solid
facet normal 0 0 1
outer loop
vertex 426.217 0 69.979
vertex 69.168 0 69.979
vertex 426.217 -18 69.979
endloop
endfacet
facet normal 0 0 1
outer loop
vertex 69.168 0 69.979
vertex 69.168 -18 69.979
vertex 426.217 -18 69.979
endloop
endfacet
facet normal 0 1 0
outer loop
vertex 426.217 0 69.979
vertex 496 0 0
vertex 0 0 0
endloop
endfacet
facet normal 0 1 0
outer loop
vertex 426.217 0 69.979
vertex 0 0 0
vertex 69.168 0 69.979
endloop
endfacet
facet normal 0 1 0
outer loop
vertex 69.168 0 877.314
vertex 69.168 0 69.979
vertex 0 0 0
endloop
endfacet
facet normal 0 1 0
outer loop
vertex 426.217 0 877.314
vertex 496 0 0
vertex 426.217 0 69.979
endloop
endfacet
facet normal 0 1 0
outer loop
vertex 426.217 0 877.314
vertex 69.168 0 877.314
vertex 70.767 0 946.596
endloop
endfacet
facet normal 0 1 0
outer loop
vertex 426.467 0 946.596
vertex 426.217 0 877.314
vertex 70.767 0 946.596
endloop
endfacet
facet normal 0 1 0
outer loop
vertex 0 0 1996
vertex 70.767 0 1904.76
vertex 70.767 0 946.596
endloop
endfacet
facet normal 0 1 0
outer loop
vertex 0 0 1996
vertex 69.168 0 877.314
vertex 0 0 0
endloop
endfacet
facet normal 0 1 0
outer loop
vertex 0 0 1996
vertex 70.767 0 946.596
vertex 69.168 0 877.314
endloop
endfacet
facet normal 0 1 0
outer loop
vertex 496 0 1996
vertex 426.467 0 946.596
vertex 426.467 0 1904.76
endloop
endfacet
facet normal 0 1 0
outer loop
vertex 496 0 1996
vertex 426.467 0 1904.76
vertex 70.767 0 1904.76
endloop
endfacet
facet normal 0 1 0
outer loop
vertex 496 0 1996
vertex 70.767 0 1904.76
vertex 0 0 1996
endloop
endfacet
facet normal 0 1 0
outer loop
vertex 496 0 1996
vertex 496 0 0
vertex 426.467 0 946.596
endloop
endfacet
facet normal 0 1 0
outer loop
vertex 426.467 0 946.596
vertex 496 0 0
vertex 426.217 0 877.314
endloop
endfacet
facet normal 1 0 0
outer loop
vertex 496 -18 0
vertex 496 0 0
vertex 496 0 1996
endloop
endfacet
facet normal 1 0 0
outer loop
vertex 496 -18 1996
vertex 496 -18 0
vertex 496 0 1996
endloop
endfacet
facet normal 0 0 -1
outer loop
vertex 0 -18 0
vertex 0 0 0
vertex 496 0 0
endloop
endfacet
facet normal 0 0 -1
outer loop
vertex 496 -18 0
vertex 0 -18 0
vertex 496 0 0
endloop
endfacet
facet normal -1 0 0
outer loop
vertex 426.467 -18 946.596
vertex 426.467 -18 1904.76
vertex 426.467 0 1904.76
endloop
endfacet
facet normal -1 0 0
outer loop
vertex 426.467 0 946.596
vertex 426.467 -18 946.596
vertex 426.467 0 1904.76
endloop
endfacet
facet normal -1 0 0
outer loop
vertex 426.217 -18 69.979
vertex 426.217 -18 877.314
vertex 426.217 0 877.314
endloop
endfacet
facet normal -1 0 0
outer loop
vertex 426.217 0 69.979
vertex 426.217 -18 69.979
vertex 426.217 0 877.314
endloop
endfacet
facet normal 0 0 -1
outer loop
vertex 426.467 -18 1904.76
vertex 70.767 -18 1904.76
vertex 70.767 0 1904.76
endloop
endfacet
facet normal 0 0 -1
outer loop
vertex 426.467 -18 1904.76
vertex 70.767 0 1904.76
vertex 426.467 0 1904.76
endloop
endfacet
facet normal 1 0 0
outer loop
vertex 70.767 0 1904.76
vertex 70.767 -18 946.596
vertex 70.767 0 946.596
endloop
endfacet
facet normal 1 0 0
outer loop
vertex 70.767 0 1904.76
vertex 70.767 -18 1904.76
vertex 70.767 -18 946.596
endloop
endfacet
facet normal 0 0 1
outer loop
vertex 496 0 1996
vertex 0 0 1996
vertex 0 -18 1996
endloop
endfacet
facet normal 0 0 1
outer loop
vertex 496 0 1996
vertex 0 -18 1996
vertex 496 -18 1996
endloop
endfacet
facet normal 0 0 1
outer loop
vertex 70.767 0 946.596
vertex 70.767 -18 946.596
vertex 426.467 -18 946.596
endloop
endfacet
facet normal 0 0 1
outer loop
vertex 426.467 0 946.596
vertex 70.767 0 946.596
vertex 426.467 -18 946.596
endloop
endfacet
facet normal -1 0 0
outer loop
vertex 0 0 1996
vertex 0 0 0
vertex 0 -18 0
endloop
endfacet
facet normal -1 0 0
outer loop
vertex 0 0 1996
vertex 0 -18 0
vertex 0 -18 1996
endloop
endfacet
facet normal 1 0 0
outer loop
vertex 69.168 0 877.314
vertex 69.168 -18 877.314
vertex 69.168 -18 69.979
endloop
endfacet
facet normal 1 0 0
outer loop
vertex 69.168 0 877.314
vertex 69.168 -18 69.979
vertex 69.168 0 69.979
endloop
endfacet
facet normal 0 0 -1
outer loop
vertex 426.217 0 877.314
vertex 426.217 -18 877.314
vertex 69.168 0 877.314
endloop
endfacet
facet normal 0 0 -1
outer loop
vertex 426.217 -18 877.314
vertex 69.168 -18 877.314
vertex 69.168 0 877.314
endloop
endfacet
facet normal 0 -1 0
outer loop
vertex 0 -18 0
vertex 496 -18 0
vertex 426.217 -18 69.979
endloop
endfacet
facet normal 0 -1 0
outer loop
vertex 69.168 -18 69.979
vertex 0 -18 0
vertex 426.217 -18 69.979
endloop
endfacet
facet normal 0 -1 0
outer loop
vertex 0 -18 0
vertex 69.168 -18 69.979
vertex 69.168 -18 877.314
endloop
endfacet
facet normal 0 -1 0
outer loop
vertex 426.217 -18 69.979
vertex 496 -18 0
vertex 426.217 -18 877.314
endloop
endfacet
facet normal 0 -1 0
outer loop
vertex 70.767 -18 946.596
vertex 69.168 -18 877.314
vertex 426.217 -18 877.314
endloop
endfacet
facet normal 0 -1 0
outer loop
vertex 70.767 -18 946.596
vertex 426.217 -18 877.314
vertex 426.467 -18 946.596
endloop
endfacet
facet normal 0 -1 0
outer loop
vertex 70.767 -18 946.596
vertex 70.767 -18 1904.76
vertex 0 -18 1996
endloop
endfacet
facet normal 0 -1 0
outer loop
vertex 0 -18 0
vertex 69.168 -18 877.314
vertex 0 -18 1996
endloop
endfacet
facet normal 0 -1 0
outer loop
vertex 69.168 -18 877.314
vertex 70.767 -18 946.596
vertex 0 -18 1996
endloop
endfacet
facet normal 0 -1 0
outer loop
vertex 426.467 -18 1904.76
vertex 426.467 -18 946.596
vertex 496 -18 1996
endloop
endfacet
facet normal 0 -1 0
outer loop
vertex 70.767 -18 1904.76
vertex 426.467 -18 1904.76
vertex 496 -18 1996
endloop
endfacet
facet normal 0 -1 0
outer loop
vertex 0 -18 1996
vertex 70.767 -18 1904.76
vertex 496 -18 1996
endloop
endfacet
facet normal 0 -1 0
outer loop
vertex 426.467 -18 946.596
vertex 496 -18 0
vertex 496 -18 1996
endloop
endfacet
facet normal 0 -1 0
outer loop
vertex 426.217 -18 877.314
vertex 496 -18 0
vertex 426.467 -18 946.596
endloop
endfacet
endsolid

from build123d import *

# Parameters (mm, degrees)
F0_W      = 50.518155098
F0_H      = 63.5085105896
F1_DEPTH  = 18
F2_DEPTH  = 496
F3_DEPTH  = 1996
F4_W      = 317.0488774776
F4_H      = 672.3350584507
F5_DEPTH  = 18
F6_DEPTH  = 66
F7_DEPTH  = 68
F8_DEPTH  = 6
F9_DEPTH  = 282
F10_DEPTH = 44
F11_DEPTH = 147
F12_W     = 357.6997369528
F12_H     = 883.1646442413
F13_DEPTH = 18
F14_DEPTH = 75
F15_DEPTH = 2


with BuildPart() as f1:
    # F0 (on Front) → F1 (new body)
    with BuildSketch(Plane.XZ):
        with Locations((25.259077549, 31.7542552948)):
            Rectangle(F0_W, F0_H)
    extrude(amount=F1_DEPTH)

    # F2 (add): a face of the model
    f2_faces = [f1.faces().sort_by_distance(p)[0] for p in [
        (0, -9, 31.7542552948),
    ]]
    extrude(f2_faces, amount=-F2_DEPTH)

    # F3 (add): a face of the model
    f3_faces = [f1.faces().sort_by_distance(p)[0] for p in [
        (248, -9, 0),
    ]]
    extrude(f3_faces, amount=-F3_DEPTH)

    # F4 (on face) → F5 (cut)
    with BuildSketch(Plane.XZ.offset(18)):
        with Locations((223.6920744181, 688.1462782621)):
            Rectangle(F4_W, F4_H)
    extrude(amount=-F5_DEPTH, mode=Mode.SUBTRACT)

    # F6 (add): a face of the model
    f6_faces = [f1.faces().sort_by_distance(p)[0] for p in [
        (65.1676356792, -9, 688.1462782621),
    ]]
    extrude(f6_faces, amount=F6_DEPTH)

    # F7 (cut): a face of the model
    f7_faces = [f1.faces().sort_by_distance(p)[0] for p in [
        (131.1676356792, -9, 688.1462782621),
    ]]
    extrude(f7_faces, amount=-F7_DEPTH, mode=Mode.SUBTRACT)

    # F8 (add): a face of the model
    f8_faces = [f1.faces().sort_by_distance(p)[0] for p in [
        (63.1676356792, -9, 688.1462782621),
    ]]
    extrude(f8_faces, amount=F8_DEPTH)

    # F9 (cut): a face of the model
    f9_faces = [f1.faces().sort_by_distance(p)[0] for p in [
        (225.6920744181, -9, 351.9787490368),
    ]]
    extrude(f9_faces, amount=-F9_DEPTH, mode=Mode.SUBTRACT)

    # F10 (cut): a face of the model
    f10_faces = [f1.faces().sort_by_distance(p)[0] for p in [
        (382.2165131569, -9, 547.1462782621),
    ]]
    extrude(f10_faces, amount=-F10_DEPTH, mode=Mode.SUBTRACT)

    # F11 (add): a face of the model
    f11_faces = [f1.faces().sort_by_distance(p)[0] for p in [
        (247.6920744181, -9, 1024.3138074875),
    ]]
    extrude(f11_faces, amount=F11_DEPTH)

    # F12 (on face) → F13 (cut)
    with BuildSketch(Plane.XZ.offset(18)):
        with Locations((249.6171072125, 1463.1779193878)):
            Rectangle(F12_W, F12_H)
    extrude(amount=-F13_DEPTH, mode=Mode.SUBTRACT)

    # F14 (cut): a face of the model
    f14_faces = [f1.faces().sort_by_distance(p)[0] for p in [
        (249.6171072125, -9, 1021.5955972672),
    ]]
    extrude(f14_faces, amount=-F14_DEPTH, mode=Mode.SUBTRACT)

    # F15 (add): a face of the model
    f15_faces = [f1.faces().sort_by_distance(p)[0] for p in [
        (428.4669756889, -9, 1425.6779193878),
    ]]
    extrude(f15_faces, amount=F15_DEPTH)


solid = f1.part
